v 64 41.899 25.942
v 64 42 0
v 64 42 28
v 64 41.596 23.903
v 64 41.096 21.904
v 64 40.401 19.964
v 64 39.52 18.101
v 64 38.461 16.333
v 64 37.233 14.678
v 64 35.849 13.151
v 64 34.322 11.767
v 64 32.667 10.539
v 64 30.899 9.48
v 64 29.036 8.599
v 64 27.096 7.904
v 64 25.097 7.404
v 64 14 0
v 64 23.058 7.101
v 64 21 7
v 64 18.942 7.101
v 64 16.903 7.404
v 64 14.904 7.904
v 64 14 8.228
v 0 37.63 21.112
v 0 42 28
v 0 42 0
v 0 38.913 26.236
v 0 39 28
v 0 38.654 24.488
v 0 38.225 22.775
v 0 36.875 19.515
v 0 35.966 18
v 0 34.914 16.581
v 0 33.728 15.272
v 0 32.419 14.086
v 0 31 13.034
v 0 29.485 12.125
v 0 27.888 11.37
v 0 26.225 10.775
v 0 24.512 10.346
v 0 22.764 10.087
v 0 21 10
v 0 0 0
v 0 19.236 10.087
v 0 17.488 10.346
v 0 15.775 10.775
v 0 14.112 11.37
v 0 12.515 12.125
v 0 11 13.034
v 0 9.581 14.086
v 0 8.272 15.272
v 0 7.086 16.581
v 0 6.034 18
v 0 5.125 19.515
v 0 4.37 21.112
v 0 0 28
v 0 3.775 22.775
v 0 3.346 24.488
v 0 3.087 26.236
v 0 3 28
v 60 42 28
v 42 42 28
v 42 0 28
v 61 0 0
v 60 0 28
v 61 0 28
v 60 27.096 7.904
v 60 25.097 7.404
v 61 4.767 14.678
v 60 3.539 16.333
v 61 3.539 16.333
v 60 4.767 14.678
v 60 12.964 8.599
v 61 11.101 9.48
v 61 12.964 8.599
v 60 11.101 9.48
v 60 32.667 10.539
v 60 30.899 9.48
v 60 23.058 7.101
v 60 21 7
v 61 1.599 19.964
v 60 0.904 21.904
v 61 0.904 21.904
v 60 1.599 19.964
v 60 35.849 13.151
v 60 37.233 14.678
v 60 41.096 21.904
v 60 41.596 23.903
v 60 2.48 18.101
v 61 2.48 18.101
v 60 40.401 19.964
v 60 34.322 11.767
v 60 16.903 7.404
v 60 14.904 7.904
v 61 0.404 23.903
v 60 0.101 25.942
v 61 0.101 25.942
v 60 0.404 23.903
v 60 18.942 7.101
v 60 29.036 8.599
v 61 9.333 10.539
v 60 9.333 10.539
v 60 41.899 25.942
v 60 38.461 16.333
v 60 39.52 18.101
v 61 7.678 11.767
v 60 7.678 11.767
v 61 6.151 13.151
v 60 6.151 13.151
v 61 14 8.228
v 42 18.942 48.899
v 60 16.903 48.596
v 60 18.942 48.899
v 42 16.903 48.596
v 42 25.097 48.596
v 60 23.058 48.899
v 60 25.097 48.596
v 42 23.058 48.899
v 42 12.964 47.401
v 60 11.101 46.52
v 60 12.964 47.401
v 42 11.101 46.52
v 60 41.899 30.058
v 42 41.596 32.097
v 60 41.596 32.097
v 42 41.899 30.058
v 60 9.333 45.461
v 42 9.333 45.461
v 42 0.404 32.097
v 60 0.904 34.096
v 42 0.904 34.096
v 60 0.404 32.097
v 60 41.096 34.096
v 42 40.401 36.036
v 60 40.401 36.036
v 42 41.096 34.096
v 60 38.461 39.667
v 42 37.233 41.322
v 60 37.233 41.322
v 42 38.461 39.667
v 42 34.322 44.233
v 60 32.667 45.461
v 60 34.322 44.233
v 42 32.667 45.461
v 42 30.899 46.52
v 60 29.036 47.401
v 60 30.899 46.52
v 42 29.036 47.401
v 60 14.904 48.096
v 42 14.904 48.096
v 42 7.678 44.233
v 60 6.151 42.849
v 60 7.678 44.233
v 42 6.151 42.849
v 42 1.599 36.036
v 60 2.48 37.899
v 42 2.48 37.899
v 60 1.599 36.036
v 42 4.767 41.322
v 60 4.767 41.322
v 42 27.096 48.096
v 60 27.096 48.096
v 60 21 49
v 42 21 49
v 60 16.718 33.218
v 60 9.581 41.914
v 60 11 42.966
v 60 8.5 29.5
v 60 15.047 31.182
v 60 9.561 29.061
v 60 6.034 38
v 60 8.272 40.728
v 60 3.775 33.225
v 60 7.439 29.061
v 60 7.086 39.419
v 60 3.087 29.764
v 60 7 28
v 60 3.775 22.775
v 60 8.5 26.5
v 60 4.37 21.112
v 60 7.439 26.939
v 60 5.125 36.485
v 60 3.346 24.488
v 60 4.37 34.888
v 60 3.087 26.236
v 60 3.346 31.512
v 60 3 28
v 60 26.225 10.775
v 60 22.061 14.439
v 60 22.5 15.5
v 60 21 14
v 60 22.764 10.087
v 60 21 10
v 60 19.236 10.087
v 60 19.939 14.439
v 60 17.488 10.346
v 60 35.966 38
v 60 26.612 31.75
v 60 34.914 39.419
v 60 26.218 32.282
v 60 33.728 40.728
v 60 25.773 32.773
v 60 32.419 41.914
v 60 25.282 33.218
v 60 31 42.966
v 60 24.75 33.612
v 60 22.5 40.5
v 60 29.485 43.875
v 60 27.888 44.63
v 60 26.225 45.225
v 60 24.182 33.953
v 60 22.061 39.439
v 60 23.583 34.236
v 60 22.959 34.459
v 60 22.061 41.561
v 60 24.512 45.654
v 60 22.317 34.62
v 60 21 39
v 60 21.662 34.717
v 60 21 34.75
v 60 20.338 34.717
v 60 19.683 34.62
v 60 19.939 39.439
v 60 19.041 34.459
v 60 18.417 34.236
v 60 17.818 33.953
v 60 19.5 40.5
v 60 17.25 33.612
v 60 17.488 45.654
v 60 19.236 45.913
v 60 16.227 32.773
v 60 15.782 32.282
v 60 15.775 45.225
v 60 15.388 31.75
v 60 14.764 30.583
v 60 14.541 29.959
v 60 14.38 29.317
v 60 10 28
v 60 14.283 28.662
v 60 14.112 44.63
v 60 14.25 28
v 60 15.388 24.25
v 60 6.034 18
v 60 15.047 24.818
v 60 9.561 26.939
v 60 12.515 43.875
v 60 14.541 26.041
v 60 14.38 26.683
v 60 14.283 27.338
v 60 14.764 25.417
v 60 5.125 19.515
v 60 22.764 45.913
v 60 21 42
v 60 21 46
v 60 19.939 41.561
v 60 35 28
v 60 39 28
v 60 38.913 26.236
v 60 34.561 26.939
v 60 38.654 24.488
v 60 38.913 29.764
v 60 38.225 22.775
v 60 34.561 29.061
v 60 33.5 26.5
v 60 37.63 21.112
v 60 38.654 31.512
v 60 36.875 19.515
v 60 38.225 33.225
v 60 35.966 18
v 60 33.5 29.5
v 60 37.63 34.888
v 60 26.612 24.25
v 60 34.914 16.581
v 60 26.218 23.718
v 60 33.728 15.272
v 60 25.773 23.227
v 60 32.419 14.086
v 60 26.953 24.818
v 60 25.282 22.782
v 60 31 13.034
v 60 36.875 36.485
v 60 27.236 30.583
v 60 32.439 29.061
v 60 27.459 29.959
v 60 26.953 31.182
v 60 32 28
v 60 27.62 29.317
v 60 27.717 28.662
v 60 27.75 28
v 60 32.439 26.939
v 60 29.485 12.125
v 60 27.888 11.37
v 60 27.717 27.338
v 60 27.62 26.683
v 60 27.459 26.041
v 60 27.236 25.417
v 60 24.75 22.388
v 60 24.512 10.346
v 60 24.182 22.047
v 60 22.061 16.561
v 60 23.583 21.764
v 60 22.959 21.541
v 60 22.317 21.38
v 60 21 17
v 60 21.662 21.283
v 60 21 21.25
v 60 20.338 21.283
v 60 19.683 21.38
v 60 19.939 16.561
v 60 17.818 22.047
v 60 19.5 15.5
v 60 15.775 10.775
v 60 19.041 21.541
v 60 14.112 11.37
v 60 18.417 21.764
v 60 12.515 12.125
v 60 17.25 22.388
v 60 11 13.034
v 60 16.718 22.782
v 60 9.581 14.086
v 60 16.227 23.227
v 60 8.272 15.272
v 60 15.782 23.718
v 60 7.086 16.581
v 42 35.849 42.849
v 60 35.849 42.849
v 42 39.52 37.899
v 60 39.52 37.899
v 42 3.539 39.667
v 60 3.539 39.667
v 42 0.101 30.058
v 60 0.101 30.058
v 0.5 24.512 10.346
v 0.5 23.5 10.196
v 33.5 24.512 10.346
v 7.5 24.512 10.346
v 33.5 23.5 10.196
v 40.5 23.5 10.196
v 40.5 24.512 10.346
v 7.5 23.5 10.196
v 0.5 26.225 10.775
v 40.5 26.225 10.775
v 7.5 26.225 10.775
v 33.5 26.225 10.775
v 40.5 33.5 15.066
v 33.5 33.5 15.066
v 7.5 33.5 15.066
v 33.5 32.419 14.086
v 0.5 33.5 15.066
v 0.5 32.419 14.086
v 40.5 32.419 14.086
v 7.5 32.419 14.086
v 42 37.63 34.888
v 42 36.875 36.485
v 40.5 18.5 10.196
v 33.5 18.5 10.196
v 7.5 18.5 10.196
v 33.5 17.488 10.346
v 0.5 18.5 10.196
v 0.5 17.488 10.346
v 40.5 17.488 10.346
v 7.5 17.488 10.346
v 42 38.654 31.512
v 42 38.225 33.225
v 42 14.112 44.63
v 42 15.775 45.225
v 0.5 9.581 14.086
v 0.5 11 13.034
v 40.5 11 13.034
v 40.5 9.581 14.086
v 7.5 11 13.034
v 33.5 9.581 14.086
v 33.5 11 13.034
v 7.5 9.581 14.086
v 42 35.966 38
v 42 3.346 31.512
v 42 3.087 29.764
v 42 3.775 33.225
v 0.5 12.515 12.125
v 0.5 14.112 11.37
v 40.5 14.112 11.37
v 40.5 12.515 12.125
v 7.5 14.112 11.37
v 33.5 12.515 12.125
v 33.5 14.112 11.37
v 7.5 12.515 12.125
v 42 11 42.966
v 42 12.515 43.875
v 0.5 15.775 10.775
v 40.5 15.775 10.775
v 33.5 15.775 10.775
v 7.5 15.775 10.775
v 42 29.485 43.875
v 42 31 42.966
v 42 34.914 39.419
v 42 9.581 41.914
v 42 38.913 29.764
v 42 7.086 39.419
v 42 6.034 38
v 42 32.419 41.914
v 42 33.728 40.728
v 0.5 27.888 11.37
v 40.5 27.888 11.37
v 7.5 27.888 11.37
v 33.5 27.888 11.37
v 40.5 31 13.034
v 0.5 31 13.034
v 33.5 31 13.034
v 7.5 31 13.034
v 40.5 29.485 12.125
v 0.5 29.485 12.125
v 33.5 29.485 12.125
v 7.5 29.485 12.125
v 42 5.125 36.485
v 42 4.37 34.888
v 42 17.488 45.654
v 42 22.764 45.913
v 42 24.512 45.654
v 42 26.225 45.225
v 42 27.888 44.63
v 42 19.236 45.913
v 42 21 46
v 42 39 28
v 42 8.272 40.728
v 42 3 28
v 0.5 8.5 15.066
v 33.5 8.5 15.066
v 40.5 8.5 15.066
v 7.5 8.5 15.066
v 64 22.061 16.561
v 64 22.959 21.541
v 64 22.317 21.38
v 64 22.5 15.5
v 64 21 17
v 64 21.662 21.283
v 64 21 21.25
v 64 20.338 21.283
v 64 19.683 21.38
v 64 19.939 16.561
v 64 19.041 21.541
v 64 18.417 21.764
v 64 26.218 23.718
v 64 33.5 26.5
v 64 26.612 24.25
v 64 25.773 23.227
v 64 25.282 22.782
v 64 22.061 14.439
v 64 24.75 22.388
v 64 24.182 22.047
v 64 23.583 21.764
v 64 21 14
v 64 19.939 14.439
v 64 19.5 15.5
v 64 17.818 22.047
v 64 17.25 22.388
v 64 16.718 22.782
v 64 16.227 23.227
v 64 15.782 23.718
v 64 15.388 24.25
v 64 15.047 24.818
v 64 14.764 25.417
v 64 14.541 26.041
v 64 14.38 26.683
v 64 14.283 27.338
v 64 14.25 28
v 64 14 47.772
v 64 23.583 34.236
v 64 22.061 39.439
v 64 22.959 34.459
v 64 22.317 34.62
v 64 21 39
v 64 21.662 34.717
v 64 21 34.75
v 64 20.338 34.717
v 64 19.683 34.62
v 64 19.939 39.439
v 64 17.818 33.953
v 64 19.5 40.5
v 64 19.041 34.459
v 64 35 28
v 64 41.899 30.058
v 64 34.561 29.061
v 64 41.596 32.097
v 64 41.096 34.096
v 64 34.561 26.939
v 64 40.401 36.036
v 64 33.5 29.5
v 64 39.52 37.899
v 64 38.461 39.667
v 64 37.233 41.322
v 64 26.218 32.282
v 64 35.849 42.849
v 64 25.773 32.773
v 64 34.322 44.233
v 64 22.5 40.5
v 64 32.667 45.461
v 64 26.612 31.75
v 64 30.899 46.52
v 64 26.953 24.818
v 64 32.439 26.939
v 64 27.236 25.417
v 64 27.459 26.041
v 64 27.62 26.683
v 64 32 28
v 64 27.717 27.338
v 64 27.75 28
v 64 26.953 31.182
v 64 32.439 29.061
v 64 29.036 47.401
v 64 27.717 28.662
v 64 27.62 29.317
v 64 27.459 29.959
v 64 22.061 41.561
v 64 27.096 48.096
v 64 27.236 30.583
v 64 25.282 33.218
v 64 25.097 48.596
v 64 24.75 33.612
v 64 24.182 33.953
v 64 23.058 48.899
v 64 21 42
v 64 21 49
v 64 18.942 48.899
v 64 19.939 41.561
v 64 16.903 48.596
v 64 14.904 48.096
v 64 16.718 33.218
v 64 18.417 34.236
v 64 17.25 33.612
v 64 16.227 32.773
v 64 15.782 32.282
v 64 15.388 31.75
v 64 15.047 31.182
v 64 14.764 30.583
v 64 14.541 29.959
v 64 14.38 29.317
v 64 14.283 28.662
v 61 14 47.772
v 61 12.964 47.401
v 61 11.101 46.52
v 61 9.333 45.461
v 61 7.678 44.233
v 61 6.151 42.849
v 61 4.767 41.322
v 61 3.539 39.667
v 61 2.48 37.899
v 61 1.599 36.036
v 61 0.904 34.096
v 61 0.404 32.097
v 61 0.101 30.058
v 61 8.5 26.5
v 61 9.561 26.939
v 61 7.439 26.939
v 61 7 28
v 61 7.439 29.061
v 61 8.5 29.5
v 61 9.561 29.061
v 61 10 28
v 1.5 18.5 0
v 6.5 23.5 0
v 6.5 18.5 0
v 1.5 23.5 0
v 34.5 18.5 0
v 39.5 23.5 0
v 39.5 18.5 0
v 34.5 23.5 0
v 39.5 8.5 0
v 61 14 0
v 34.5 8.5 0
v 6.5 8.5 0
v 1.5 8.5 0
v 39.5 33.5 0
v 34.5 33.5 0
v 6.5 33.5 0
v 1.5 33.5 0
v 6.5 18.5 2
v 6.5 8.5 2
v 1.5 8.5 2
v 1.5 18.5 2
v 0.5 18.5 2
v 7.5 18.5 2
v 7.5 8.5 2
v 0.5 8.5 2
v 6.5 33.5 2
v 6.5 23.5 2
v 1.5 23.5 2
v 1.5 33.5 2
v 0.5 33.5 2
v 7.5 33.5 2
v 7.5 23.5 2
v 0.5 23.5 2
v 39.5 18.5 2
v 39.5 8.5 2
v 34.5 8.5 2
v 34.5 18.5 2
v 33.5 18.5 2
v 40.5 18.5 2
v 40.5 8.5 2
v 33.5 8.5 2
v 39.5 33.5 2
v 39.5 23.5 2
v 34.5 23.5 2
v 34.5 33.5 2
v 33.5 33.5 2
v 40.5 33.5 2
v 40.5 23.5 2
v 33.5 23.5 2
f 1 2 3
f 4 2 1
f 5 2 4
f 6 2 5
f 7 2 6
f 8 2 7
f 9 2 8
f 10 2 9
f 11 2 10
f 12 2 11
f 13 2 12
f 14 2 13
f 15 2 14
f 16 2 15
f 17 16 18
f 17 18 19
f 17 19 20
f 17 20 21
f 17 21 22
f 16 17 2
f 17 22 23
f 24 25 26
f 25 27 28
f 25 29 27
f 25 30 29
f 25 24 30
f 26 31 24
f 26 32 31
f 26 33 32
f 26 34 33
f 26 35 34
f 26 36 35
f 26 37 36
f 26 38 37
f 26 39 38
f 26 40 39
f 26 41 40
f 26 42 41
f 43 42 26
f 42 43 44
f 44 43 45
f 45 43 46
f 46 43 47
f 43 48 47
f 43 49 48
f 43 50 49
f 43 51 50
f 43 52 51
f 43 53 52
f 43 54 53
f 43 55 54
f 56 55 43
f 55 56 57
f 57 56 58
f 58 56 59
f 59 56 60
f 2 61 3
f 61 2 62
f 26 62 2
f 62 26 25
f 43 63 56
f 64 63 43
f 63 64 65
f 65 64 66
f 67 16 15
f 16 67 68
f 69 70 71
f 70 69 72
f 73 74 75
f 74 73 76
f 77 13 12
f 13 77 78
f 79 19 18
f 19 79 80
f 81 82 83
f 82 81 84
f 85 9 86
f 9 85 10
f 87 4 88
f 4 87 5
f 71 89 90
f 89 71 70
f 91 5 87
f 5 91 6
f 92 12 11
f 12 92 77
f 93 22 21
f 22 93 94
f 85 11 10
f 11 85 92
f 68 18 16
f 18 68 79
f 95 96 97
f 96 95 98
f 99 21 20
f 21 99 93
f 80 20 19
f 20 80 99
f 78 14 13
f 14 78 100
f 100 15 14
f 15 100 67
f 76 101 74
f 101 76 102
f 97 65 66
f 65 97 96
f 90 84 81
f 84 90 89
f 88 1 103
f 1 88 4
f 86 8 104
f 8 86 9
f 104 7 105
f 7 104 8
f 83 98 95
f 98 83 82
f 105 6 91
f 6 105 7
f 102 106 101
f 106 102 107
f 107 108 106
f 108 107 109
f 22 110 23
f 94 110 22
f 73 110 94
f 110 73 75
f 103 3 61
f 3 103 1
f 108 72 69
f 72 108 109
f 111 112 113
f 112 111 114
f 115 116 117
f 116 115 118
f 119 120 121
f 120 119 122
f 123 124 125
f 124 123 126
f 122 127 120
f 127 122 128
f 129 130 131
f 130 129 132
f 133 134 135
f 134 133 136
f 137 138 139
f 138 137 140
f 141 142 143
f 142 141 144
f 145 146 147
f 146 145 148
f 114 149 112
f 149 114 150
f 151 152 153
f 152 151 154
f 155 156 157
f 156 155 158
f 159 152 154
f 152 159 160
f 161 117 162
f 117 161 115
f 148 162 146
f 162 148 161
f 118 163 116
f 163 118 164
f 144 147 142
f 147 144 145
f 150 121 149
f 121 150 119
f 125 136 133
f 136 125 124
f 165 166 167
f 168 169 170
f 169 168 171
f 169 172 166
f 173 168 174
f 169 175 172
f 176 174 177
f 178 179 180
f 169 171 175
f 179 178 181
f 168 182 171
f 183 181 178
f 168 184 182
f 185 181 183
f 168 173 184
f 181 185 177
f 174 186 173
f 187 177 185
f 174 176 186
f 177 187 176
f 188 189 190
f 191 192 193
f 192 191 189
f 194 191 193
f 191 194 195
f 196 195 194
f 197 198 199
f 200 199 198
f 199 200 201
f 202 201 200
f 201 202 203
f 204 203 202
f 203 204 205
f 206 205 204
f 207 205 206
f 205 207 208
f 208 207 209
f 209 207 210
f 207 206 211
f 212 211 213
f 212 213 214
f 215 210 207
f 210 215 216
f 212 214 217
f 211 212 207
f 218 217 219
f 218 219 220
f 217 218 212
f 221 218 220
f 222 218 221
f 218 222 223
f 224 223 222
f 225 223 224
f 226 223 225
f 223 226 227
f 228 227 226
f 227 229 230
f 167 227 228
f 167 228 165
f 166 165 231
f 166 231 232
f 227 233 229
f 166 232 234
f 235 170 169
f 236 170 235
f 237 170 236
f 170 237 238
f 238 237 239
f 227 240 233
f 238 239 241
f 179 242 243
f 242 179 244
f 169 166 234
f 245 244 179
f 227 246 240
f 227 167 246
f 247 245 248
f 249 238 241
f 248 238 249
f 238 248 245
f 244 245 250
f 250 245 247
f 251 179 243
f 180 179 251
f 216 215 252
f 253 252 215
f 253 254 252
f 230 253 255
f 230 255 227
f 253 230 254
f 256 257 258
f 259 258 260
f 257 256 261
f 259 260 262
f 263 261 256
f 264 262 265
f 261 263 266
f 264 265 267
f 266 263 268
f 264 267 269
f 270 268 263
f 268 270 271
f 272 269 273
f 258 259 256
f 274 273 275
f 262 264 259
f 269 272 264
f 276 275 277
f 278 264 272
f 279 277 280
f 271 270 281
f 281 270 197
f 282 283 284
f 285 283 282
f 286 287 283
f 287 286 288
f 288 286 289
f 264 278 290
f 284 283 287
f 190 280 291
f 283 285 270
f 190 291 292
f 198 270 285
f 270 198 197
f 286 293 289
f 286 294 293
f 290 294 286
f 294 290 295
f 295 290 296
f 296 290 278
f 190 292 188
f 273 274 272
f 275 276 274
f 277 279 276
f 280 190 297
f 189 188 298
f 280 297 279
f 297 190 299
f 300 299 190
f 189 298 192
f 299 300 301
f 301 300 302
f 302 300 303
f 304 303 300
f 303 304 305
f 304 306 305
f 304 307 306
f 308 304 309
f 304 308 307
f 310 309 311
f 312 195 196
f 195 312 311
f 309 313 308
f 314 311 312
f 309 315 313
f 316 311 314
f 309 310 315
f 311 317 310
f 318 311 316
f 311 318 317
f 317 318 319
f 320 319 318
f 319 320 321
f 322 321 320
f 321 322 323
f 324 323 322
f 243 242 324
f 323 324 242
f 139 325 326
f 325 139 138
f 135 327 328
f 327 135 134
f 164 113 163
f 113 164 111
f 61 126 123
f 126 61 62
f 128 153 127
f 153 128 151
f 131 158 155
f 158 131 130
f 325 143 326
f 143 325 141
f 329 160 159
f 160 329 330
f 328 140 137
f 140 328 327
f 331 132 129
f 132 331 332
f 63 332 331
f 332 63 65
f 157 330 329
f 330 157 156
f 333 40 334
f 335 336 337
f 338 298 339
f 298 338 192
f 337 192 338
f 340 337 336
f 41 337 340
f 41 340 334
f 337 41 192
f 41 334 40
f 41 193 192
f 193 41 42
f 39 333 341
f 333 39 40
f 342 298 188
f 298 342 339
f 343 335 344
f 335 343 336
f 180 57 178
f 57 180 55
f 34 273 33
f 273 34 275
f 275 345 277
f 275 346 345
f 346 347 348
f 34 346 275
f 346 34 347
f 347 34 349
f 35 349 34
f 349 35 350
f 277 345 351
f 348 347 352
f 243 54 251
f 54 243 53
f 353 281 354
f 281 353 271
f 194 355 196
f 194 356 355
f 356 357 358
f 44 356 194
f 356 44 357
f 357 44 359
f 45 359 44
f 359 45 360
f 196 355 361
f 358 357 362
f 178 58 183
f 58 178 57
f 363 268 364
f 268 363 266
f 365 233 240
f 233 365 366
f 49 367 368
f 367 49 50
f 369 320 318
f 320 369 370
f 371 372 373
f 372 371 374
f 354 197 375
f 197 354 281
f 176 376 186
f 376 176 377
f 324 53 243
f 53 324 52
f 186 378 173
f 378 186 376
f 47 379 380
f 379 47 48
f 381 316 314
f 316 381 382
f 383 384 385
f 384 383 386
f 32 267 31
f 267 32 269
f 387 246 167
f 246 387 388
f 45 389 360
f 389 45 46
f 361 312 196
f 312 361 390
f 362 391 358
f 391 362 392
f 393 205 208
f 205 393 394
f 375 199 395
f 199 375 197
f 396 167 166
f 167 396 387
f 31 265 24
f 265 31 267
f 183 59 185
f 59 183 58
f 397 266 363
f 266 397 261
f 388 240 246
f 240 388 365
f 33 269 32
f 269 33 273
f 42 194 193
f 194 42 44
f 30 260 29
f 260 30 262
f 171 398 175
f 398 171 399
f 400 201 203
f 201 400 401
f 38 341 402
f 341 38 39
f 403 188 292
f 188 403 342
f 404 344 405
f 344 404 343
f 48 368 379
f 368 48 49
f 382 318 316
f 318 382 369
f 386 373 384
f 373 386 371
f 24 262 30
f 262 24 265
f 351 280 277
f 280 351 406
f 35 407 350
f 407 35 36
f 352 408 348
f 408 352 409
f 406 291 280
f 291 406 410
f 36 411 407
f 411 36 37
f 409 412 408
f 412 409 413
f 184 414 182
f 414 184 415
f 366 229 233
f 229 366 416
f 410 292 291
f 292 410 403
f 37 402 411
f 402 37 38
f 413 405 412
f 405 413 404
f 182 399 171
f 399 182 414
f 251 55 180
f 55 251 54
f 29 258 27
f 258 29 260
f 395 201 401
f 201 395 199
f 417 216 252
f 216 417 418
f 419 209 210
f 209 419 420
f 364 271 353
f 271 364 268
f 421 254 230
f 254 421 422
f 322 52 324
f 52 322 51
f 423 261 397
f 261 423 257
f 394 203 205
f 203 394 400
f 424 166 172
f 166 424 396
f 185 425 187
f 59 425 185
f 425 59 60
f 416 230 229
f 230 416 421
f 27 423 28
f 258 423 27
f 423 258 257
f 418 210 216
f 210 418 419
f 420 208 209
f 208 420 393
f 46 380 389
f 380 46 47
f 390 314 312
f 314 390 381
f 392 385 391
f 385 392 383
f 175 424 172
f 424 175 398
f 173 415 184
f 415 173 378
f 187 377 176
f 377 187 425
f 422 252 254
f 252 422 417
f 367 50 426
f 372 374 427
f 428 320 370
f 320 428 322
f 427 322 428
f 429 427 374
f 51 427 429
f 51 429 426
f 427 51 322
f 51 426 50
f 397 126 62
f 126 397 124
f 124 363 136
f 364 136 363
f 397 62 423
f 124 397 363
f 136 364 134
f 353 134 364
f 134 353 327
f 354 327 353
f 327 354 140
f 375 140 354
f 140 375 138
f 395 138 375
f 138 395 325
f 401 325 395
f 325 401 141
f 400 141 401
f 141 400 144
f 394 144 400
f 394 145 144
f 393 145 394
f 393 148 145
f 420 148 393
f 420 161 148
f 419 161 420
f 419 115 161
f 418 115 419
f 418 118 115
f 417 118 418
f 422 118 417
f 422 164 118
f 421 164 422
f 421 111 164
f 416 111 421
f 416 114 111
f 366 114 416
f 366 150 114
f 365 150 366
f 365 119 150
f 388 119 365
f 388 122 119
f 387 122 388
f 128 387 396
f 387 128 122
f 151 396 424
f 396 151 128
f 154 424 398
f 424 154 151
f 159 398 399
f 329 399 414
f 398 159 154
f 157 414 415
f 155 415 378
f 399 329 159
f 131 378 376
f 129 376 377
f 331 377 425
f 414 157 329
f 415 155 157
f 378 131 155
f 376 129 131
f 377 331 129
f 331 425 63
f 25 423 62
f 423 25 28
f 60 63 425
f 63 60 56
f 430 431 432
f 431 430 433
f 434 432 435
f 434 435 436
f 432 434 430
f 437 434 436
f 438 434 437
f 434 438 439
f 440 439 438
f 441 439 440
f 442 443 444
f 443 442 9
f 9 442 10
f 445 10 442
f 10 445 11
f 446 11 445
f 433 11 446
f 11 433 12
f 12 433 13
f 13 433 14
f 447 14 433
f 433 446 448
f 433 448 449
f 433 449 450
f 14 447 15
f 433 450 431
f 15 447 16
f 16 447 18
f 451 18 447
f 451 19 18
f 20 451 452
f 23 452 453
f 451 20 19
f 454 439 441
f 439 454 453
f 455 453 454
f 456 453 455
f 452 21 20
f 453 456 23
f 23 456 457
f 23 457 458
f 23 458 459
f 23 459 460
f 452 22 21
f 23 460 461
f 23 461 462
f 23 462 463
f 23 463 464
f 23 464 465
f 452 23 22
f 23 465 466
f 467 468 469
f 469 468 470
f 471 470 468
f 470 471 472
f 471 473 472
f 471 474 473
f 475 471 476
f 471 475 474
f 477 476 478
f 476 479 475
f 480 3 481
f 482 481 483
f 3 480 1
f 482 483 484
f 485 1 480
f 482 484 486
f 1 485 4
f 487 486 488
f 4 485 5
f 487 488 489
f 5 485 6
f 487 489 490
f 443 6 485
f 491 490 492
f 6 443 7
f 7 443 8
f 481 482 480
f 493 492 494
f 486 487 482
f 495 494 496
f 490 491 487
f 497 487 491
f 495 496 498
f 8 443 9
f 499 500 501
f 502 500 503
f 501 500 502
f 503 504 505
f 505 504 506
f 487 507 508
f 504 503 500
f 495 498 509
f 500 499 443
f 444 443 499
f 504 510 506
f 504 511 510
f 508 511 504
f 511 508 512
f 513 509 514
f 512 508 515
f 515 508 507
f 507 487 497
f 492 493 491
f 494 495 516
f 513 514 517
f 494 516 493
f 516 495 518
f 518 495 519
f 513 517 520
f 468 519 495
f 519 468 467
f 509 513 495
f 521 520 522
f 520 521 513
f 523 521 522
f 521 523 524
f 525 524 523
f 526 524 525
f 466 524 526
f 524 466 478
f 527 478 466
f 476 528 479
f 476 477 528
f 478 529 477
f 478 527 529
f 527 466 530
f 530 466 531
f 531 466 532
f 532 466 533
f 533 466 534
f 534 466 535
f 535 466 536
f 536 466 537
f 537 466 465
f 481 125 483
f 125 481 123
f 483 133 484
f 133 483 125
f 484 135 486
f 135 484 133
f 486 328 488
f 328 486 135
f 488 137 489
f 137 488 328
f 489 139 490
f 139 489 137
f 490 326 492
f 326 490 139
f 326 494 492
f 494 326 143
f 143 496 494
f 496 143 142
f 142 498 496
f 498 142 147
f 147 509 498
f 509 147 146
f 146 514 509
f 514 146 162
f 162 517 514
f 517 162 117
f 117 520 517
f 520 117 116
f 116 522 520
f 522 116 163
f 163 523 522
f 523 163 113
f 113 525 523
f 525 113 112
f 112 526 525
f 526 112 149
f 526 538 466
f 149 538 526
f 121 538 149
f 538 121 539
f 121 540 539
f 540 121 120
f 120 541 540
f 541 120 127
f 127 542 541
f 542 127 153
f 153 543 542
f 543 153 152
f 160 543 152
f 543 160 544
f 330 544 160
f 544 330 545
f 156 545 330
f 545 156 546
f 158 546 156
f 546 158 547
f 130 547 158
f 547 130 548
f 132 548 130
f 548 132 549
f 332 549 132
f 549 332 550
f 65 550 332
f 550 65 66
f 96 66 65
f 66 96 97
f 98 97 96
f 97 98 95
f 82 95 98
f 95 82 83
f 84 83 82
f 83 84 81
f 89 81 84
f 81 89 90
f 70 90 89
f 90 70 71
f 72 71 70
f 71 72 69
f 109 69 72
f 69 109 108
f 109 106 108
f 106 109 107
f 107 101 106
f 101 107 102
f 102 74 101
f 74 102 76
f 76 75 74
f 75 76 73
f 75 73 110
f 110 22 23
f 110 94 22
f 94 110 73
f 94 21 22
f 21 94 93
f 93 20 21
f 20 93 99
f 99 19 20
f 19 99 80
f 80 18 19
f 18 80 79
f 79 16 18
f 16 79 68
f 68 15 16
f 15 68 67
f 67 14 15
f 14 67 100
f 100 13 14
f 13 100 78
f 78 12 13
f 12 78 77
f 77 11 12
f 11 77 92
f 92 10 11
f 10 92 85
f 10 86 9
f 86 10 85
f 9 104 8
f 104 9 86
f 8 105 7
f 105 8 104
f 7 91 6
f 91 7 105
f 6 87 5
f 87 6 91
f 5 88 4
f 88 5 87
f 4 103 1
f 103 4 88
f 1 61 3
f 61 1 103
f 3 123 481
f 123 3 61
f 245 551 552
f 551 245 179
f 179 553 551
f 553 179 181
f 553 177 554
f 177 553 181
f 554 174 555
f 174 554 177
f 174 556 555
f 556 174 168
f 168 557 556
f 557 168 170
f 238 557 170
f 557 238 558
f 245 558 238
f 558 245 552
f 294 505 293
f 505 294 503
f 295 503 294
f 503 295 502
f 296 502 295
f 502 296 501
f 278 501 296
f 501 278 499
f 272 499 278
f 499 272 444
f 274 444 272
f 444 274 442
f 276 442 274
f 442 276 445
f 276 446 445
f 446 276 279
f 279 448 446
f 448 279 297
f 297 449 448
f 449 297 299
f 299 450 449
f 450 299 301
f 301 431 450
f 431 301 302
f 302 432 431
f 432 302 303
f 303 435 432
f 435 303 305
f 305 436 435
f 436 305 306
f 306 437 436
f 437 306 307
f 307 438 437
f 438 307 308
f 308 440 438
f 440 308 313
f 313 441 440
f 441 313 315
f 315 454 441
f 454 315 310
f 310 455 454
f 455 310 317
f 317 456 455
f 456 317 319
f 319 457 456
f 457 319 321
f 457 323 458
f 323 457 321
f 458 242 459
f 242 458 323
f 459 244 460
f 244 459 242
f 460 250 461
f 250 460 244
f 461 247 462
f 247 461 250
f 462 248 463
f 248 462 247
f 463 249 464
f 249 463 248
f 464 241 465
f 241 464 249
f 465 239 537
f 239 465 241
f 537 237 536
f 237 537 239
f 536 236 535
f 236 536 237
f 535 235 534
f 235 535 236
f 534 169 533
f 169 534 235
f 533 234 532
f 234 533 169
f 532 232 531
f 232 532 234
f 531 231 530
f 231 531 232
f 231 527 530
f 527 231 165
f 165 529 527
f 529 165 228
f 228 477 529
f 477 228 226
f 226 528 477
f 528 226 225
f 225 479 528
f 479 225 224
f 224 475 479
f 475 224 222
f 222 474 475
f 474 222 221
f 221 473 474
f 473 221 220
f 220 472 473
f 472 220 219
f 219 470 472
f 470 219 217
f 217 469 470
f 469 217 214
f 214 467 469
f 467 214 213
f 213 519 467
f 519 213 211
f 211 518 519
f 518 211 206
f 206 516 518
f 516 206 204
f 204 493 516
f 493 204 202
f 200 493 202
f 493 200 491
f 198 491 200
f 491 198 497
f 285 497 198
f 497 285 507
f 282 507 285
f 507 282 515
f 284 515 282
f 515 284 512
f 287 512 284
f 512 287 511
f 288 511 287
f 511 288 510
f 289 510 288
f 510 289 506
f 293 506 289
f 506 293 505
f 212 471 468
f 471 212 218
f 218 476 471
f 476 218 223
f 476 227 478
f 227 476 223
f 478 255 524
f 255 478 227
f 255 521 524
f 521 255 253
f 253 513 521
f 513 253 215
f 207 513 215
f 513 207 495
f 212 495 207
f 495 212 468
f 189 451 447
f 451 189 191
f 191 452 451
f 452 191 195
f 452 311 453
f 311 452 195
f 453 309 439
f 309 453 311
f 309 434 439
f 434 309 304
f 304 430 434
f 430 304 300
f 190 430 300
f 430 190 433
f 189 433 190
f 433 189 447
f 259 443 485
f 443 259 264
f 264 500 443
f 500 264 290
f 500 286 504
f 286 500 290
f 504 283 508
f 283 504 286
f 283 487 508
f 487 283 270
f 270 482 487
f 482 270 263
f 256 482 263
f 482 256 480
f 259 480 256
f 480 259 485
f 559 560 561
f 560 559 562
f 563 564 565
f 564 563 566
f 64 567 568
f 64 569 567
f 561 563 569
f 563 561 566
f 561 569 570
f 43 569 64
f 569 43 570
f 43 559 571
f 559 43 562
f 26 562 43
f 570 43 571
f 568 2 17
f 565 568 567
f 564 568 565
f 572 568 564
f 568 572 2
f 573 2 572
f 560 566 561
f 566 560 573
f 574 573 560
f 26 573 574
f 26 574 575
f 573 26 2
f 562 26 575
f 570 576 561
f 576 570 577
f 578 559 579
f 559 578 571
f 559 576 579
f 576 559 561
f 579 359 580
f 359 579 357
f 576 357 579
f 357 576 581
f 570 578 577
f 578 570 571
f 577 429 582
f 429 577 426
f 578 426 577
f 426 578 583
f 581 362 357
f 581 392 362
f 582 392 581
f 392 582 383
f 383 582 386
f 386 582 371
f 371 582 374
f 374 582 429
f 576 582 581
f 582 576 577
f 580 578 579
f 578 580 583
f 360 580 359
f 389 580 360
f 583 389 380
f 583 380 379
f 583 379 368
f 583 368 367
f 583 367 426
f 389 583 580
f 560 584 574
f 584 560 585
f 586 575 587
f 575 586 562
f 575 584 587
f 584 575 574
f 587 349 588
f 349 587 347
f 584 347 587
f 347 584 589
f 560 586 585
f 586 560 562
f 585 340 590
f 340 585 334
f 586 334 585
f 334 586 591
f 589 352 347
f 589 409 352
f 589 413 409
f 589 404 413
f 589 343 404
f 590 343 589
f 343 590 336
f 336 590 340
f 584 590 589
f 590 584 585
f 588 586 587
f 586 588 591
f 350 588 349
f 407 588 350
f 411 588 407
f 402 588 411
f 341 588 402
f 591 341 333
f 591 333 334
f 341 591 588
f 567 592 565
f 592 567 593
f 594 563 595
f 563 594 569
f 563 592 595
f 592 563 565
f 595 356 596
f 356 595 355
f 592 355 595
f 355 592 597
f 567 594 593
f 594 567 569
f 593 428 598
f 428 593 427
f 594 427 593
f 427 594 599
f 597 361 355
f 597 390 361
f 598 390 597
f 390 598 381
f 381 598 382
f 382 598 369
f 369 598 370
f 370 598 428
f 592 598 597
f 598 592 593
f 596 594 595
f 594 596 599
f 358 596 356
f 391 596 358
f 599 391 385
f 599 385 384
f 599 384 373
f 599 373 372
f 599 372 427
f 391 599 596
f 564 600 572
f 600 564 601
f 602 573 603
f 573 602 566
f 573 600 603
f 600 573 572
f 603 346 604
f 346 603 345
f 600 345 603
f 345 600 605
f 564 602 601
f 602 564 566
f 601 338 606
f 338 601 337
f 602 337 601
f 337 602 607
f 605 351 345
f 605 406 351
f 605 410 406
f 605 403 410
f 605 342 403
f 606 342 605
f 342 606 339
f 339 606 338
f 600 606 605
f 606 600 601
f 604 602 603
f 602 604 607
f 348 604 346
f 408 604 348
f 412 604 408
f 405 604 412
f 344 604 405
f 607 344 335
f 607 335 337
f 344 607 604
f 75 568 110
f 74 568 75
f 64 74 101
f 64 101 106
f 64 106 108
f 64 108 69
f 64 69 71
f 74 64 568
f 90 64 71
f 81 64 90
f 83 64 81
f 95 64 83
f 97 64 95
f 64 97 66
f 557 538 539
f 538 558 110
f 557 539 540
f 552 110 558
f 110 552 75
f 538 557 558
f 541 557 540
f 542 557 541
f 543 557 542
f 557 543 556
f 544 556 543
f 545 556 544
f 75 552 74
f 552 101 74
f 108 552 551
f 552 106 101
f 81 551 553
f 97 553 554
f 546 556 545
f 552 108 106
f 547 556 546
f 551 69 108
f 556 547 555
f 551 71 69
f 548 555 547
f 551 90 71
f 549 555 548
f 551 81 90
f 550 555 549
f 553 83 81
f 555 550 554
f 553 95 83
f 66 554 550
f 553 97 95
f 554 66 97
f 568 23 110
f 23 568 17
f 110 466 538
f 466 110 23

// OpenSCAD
fn=64;		// Resolution for circular shapes
$fn=fn;		// Set global resolution for circles
//? fragment; sizes 
// Motor dimensions
motor_d=36;			// Motor diameter
motor_l=60;			// Motor length

// Plate parameters
plate_screw_d = 3;			// Diameter of plate screw holes
plate_screw_off = 25/2;		// Offset of screw holes from center
plate_gear_hole_d = 13.5;	// Diameter of gear hole
plate_gear_hole_l = 16;		// Depth of gear hole

// Bottom screw offsets
bottom_screw_1_gap_y = 15;
bottom_screw_2_gap_y = 15;
bottom_screw_1_gap_x = 4;
bottom_screw_2_gap_x = 37;

// Thickness parameters
plate_h=4;			// Plate thickness
bottom_t = 7;		// Bottom thickness
front_t = 3;		// Front thickness for casing walls

// Motor case calculations
motor_case_d = motor_d + front_t * 2;  // Outer diameter including front thickness

// Position offsets
motor_plate_y = 14;
motor_plate_x_off = 1;

// Subtracting inner components from the main shape
difference()
{
	translate([0,0,bottom_t])
	//? union?
	union()
	{
		// Add motor mounting plate
		//? translate
		translate([motor_l,motor_case_d/2,motor_case_d/2])
		rotate([0,90,0])
		plate(plate_h=plate_h);
		// Create the motor casing with subtractions for motor and cutouts
		difference()
		{
			//test();
			motor_case();

			// Subtract space for motor inside the case
			translate([0,front_t,front_t])
			motor();

			// Create cutout section inside motor case
			translate([0,0,motor_case_d/2])
			cube([motor_l-18, motor_case_d, motor_case_d/2]);
		}

		// Bottom support base for the motor casing
		translate([0,0,-bottom_t])
		cube([motor_l+plate_h, motor_case_d, bottom_t]);
	}

	// Cutting out space for motor plate attachment
	translate([motor_l+motor_plate_x_off,0,0])
	cube([plate_h,motor_plate_y,motor_case_d+bottom_t]);

	// Add bottom screw holes (hidden in preview using #)
	translate([0,front_t,4])
	bottom_screws();
}

// Creates the outer motor case
module motor_case()
{
	translate([0,motor_case_d/2,motor_case_d/2])
	rotate([0,90,0])
	cylinder(d=motor_case_d, h=motor_l);

	// Subtract a slot for motor fitting
	difference()
	{
		cube([motor_l+plate_h, motor_case_d, motor_case_d/2]);
		translate([0,motor_case_d/2,motor_case_d/2])
		rotate([0,90,0])
		cylinder(d=motor_case_d, h=motor_l+plate_h);
	}
}

// Places screws at the bottom of the casing
module bottom_screws()
{
	translate([bottom_screw_1_gap_x, (motor_d-bottom_screw_1_gap_y)/2, 0])
	{
		screwCube();
		translate([0,bottom_screw_1_gap_y,0])
		screwCube();
	}

	translate([bottom_screw_2_gap_x, (motor_d-bottom_screw_2_gap_y)/2, 0])
	{
		screwCube();
		translate([0,bottom_screw_2_gap_y,0])
		screwCube();
	}
}

module screwCube(width=5, depth=10, height=20)
{
    cube([width,depth,height], true); // Top
    translate([0,0,8]) //5 (0 point) 3mm nut height
	cube([width+2,depth,height], true); // Bottom
}

// Creates a screw with a head and shaft
module screw(d1=8, d2=5, l2=20, l1=50)
{
	cylinder(d=d1, h=l1, $fn=fn/4);  // Top screw (body)
	translate([0,0,-l2])
	cylinder(d=d2, h=l2, $fn=fn/4);  // Bottom screw (head)
}

// Creates the motor shape inside the casing
module motor()
{
	translate([0,motor_d/2,motor_d/2])
	rotate([0,90,0])
	union()
	{
		cylinder(d=motor_d, h=motor_l);  // Main motor body
		cylinder(d=plate_gear_hole_d, h=motor_l+plate_gear_hole_l);  // Gear shaft
	}
}

// Creates the motor mounting plate with screw holes
module plate(plate_h=1.5)
{
	rotate([0,0,180])
	difference()
	{
		linear_extrude(height = plate_h)
		difference()
		{
			circle(d=motor_case_d);       // Outer plate diameter
		  circle(d=plate_gear_hole_d);   // Gear hole cutout

			// Screw holes at each quadrant of the plate
			translate([plate_screw_off,0,0])
			circle(d=plate_screw_d,$fn=fn/8);

			translate([-plate_screw_off,0,0])
			circle(d=plate_screw_d,$fn=fn/8);

			translate([0,plate_screw_off,0])
			circle(d=plate_screw_d,$fn=fn/8);

			translate([0,-plate_screw_off,0])
			circle(d=plate_screw_d,$fn=fn/8);
		}
	}
}
